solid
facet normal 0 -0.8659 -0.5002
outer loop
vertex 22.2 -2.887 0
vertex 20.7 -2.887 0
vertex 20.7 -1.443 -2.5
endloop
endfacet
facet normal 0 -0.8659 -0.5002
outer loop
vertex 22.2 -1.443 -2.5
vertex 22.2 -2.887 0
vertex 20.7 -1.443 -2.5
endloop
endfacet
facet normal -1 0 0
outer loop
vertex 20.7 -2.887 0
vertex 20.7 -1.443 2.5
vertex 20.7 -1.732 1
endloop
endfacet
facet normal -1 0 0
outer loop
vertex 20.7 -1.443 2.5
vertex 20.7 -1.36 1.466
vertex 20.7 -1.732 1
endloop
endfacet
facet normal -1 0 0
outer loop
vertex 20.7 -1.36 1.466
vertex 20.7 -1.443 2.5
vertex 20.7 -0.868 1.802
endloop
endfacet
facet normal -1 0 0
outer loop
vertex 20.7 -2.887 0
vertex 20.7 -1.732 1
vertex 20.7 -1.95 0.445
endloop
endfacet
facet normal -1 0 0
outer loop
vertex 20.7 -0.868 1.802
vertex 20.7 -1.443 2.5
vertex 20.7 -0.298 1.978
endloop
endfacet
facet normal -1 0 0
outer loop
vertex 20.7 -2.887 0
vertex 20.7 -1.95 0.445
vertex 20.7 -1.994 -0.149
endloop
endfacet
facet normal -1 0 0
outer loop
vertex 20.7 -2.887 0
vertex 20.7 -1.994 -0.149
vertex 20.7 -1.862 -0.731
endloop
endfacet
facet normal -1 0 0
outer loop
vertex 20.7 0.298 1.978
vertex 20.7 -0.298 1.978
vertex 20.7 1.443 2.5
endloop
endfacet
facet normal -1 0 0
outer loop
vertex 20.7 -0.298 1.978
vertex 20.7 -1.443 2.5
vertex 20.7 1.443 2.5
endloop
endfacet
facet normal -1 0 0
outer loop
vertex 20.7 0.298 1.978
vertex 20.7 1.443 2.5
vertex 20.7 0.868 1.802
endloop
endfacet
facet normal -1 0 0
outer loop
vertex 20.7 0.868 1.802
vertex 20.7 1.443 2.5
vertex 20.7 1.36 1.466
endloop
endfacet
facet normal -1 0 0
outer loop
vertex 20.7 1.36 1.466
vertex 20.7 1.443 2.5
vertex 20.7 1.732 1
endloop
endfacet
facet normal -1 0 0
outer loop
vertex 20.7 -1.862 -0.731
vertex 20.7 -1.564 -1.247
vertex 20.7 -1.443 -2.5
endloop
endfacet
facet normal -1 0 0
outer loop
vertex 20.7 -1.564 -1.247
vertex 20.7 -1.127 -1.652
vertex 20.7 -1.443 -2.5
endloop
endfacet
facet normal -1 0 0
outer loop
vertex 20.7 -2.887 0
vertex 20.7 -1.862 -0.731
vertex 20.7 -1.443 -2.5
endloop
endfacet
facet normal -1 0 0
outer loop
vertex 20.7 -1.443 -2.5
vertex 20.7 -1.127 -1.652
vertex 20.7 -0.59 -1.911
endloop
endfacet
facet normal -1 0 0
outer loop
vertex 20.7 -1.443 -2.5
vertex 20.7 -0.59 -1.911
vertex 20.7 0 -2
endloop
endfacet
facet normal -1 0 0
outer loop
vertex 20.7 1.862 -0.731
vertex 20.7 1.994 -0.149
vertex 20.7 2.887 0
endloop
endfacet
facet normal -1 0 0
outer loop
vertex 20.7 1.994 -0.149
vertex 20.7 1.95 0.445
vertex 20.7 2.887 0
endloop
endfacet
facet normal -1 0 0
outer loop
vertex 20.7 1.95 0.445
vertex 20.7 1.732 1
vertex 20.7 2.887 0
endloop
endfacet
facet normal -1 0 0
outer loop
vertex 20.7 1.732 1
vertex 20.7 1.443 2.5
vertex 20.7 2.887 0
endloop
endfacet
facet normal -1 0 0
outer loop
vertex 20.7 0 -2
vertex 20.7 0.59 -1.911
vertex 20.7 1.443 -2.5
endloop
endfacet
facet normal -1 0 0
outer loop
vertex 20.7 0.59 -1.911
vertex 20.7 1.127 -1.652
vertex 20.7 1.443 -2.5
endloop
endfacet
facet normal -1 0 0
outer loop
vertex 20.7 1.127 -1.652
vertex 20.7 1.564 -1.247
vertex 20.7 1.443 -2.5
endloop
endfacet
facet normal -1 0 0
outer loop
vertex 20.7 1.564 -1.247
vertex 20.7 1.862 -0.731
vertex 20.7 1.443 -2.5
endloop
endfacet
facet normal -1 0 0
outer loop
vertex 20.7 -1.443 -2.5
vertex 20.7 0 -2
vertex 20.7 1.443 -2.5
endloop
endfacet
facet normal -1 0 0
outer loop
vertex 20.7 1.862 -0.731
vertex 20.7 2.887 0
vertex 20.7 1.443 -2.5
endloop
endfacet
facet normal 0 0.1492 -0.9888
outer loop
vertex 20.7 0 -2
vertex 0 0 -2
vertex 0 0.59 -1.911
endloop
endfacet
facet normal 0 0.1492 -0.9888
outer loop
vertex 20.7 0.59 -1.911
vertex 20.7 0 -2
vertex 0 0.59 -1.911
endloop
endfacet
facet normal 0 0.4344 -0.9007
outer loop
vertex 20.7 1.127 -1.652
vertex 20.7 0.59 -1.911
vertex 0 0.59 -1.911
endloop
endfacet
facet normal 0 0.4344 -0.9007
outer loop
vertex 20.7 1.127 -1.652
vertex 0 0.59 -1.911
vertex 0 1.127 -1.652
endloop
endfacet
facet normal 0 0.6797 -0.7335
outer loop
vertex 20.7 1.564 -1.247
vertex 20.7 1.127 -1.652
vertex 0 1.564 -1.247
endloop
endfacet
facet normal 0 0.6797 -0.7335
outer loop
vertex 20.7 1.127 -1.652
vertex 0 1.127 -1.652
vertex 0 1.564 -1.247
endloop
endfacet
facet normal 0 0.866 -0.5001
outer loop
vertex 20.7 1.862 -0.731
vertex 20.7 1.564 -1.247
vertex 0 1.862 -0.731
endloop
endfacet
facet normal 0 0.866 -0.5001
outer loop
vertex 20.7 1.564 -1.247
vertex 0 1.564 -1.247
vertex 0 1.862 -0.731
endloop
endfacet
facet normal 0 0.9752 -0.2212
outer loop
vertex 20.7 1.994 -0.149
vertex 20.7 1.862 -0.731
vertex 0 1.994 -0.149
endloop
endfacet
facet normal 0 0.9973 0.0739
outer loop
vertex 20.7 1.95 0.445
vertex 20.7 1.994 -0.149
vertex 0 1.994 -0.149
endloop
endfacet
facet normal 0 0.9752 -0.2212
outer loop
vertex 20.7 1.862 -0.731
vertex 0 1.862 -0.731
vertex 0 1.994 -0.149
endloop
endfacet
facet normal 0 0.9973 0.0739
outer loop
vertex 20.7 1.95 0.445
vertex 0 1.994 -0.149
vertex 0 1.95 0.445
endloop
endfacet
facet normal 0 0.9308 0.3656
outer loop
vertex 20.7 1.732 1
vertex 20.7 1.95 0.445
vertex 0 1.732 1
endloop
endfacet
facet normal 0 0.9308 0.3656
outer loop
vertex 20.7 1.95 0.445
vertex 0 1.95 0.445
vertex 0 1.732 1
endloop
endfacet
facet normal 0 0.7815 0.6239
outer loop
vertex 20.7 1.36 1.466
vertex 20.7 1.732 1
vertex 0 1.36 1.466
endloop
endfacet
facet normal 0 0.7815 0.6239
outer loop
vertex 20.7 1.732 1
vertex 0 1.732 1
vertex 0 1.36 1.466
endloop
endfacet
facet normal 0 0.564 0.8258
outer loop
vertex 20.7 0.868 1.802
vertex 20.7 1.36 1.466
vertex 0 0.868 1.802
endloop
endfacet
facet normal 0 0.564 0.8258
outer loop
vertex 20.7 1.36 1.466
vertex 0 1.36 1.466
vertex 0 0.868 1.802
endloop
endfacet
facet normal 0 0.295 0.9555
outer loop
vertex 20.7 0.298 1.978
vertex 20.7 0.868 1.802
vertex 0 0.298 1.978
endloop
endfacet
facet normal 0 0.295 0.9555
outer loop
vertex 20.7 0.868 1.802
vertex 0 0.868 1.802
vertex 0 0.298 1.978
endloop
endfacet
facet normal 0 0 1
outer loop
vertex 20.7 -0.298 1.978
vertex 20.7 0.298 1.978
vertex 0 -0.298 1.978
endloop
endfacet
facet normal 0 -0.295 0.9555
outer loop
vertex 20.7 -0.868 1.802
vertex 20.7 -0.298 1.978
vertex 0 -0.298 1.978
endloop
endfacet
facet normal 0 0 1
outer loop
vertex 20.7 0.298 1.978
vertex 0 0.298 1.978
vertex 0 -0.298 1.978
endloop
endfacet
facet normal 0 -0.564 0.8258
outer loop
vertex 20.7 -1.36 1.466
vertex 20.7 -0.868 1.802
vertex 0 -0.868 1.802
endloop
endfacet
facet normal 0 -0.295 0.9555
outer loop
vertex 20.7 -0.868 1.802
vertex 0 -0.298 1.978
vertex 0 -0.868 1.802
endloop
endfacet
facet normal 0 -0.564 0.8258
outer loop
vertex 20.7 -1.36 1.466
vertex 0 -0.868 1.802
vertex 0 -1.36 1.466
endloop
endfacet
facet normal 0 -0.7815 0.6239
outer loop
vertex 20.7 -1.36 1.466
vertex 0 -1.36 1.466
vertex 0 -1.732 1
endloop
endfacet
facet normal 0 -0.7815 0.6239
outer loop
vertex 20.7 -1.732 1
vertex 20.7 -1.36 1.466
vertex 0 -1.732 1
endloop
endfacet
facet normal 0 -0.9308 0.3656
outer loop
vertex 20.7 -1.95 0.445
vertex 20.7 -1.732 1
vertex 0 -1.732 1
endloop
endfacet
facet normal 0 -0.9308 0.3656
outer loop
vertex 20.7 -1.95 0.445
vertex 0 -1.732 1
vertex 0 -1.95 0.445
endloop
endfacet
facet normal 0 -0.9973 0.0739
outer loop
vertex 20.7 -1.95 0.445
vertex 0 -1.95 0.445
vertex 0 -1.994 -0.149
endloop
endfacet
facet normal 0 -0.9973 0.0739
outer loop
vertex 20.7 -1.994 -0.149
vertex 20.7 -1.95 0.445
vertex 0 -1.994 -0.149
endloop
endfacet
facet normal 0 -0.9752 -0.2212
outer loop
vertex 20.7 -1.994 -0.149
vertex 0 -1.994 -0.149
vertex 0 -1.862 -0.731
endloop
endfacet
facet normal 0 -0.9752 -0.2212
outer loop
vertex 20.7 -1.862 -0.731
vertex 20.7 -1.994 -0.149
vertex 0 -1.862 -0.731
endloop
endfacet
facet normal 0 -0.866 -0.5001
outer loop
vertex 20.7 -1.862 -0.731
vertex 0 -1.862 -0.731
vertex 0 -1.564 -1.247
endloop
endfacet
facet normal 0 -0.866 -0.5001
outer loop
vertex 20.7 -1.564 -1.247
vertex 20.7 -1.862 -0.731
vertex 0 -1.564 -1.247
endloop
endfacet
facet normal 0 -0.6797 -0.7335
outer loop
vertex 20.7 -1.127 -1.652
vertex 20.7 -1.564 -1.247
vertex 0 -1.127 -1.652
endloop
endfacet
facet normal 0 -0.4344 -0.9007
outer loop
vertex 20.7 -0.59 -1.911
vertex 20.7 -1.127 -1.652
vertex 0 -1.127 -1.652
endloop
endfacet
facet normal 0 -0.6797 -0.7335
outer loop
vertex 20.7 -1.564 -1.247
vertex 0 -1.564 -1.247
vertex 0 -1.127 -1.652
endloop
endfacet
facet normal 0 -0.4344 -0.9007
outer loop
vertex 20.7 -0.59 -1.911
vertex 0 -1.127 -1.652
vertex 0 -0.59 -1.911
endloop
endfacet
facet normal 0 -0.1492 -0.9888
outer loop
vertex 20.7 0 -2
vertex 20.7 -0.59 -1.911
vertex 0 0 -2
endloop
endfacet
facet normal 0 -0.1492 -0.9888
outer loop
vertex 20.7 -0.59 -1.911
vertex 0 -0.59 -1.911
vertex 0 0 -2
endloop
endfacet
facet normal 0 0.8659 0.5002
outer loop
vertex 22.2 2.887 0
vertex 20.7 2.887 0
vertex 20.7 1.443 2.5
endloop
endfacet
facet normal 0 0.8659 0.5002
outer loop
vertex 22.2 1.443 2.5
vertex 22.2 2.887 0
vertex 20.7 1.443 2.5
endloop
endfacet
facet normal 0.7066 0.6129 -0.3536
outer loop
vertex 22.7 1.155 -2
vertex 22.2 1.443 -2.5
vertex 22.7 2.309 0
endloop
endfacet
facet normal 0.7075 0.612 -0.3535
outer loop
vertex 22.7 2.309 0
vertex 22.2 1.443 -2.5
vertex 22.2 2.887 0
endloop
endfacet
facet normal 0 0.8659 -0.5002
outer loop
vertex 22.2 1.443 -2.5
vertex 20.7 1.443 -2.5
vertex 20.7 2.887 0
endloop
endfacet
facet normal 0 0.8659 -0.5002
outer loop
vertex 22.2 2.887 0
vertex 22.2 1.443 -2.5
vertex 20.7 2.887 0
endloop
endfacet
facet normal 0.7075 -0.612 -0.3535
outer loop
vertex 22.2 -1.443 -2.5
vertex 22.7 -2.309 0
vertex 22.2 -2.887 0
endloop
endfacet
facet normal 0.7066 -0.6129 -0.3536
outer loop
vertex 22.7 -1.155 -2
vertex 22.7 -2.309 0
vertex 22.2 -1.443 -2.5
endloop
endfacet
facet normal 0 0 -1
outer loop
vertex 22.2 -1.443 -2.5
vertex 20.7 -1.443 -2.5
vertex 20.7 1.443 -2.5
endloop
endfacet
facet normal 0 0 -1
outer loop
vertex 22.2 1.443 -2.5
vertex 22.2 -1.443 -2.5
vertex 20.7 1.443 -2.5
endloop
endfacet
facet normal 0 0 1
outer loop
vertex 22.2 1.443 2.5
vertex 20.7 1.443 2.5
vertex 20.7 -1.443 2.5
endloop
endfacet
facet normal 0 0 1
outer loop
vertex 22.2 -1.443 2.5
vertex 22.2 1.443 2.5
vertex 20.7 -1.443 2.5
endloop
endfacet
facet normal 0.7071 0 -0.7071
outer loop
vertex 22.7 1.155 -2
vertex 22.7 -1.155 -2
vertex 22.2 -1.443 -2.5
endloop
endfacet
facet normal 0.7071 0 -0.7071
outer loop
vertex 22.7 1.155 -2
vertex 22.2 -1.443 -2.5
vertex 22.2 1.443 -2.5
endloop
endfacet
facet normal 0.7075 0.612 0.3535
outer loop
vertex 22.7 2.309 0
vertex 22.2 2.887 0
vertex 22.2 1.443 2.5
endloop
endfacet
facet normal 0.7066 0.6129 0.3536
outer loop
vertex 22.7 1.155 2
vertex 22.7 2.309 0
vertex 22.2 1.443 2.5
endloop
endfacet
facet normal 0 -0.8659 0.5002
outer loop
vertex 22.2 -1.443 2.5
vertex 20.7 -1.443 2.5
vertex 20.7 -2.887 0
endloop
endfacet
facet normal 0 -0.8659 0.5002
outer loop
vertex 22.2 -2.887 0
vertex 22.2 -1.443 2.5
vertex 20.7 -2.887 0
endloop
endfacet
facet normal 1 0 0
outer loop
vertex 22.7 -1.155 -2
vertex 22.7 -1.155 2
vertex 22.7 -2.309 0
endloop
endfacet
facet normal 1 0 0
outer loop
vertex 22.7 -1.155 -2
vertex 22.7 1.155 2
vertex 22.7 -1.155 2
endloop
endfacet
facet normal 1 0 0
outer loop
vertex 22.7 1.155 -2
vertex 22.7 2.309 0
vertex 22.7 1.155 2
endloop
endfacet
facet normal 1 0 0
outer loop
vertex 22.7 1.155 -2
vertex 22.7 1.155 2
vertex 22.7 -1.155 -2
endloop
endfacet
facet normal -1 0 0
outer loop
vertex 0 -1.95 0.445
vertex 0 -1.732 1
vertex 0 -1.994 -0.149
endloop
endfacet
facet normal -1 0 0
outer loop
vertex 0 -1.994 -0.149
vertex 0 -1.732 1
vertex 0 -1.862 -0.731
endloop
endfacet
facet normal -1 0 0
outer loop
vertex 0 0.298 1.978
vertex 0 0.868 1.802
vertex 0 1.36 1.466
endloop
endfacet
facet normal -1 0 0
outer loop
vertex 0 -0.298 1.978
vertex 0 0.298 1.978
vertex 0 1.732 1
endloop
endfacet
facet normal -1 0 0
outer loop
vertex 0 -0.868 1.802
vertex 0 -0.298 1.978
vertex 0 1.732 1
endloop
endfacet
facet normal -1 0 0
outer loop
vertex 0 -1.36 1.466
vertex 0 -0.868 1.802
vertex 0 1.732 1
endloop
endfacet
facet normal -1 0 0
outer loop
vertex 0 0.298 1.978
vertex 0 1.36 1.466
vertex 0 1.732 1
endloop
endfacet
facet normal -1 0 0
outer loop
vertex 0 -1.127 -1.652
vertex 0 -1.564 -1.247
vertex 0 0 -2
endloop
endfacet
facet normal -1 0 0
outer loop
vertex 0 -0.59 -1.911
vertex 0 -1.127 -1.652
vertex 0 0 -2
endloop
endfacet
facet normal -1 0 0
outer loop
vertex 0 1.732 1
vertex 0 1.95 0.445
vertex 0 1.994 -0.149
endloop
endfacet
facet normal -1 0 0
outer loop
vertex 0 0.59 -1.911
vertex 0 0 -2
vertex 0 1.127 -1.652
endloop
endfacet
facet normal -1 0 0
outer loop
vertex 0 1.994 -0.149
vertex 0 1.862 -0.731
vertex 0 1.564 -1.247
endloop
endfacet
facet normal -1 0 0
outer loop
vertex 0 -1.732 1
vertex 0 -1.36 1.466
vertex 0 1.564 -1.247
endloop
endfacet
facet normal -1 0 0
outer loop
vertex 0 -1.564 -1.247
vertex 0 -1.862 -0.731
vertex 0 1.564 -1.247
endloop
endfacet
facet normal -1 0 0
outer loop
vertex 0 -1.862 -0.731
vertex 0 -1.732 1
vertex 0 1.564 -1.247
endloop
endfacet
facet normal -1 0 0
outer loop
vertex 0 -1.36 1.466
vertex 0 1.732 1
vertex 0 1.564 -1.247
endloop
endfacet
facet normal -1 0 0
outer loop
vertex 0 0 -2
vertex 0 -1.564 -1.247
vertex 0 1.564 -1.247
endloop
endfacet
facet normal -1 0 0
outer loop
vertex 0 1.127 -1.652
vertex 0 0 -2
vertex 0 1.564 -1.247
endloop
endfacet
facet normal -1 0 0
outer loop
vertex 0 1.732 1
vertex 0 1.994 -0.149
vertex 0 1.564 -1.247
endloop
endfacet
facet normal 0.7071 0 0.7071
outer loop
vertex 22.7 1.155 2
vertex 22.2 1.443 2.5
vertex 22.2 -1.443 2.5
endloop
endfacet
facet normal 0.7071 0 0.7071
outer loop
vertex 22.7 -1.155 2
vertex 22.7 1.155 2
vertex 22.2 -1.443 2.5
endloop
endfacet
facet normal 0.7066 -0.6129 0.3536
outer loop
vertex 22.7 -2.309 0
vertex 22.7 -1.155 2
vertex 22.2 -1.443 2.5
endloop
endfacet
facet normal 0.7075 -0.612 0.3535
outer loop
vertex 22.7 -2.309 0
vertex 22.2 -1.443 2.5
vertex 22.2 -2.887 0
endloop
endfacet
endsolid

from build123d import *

# Parameters (mm, degrees)
SKETCH1_R           = 2
BOSS_EXTRUDE1_DEPTH = 20.7
BOSS_EXTRUDE2_DEPTH = 2
CHAMFER1_SIZE       = 0.5


with BuildPart() as part:
    # Sketch1 → Boss-Extrude1 (new body)
    with BuildSketch(Plane(origin=(0, 0, 0), x_dir=(0, 0, -1), z_dir=(1, 0, 0))):
        Circle(SKETCH1_R)
    extrude(amount=BOSS_EXTRUDE1_DEPTH)

    # Sketch2 → Boss-Extrude2 (add)
    with BuildSketch(Plane(origin=(20.7, 0, 0), x_dir=(0, 0, -1), z_dir=(1, 0, 0))):
        Polygon((0, -2.886751346), (2.5, -1.443375673), (2.5, 1.443375673), (0, 2.886751346), (-2.5, 1.443375673), (-2.5, -1.443375673), align=None)
    extrude(amount=BOSS_EXTRUDE2_DEPTH)

    # Chamfer1
    chamfer1_edges = [part.edges().sort_by_distance(p)[0] for p in [
        (22.7, -2.165063509, 1.25),
        (22.7, -2.165063509, -1.25),
        (22.7, 0, -2.5),
        (22.7, 2.165063509, -1.25),
        (22.7, 2.165063509, 1.25),
        (22.7, 0, 2.5),
    ]]
    chamfer(chamfer1_edges, length=CHAMFER1_SIZE)


solid = part.part
